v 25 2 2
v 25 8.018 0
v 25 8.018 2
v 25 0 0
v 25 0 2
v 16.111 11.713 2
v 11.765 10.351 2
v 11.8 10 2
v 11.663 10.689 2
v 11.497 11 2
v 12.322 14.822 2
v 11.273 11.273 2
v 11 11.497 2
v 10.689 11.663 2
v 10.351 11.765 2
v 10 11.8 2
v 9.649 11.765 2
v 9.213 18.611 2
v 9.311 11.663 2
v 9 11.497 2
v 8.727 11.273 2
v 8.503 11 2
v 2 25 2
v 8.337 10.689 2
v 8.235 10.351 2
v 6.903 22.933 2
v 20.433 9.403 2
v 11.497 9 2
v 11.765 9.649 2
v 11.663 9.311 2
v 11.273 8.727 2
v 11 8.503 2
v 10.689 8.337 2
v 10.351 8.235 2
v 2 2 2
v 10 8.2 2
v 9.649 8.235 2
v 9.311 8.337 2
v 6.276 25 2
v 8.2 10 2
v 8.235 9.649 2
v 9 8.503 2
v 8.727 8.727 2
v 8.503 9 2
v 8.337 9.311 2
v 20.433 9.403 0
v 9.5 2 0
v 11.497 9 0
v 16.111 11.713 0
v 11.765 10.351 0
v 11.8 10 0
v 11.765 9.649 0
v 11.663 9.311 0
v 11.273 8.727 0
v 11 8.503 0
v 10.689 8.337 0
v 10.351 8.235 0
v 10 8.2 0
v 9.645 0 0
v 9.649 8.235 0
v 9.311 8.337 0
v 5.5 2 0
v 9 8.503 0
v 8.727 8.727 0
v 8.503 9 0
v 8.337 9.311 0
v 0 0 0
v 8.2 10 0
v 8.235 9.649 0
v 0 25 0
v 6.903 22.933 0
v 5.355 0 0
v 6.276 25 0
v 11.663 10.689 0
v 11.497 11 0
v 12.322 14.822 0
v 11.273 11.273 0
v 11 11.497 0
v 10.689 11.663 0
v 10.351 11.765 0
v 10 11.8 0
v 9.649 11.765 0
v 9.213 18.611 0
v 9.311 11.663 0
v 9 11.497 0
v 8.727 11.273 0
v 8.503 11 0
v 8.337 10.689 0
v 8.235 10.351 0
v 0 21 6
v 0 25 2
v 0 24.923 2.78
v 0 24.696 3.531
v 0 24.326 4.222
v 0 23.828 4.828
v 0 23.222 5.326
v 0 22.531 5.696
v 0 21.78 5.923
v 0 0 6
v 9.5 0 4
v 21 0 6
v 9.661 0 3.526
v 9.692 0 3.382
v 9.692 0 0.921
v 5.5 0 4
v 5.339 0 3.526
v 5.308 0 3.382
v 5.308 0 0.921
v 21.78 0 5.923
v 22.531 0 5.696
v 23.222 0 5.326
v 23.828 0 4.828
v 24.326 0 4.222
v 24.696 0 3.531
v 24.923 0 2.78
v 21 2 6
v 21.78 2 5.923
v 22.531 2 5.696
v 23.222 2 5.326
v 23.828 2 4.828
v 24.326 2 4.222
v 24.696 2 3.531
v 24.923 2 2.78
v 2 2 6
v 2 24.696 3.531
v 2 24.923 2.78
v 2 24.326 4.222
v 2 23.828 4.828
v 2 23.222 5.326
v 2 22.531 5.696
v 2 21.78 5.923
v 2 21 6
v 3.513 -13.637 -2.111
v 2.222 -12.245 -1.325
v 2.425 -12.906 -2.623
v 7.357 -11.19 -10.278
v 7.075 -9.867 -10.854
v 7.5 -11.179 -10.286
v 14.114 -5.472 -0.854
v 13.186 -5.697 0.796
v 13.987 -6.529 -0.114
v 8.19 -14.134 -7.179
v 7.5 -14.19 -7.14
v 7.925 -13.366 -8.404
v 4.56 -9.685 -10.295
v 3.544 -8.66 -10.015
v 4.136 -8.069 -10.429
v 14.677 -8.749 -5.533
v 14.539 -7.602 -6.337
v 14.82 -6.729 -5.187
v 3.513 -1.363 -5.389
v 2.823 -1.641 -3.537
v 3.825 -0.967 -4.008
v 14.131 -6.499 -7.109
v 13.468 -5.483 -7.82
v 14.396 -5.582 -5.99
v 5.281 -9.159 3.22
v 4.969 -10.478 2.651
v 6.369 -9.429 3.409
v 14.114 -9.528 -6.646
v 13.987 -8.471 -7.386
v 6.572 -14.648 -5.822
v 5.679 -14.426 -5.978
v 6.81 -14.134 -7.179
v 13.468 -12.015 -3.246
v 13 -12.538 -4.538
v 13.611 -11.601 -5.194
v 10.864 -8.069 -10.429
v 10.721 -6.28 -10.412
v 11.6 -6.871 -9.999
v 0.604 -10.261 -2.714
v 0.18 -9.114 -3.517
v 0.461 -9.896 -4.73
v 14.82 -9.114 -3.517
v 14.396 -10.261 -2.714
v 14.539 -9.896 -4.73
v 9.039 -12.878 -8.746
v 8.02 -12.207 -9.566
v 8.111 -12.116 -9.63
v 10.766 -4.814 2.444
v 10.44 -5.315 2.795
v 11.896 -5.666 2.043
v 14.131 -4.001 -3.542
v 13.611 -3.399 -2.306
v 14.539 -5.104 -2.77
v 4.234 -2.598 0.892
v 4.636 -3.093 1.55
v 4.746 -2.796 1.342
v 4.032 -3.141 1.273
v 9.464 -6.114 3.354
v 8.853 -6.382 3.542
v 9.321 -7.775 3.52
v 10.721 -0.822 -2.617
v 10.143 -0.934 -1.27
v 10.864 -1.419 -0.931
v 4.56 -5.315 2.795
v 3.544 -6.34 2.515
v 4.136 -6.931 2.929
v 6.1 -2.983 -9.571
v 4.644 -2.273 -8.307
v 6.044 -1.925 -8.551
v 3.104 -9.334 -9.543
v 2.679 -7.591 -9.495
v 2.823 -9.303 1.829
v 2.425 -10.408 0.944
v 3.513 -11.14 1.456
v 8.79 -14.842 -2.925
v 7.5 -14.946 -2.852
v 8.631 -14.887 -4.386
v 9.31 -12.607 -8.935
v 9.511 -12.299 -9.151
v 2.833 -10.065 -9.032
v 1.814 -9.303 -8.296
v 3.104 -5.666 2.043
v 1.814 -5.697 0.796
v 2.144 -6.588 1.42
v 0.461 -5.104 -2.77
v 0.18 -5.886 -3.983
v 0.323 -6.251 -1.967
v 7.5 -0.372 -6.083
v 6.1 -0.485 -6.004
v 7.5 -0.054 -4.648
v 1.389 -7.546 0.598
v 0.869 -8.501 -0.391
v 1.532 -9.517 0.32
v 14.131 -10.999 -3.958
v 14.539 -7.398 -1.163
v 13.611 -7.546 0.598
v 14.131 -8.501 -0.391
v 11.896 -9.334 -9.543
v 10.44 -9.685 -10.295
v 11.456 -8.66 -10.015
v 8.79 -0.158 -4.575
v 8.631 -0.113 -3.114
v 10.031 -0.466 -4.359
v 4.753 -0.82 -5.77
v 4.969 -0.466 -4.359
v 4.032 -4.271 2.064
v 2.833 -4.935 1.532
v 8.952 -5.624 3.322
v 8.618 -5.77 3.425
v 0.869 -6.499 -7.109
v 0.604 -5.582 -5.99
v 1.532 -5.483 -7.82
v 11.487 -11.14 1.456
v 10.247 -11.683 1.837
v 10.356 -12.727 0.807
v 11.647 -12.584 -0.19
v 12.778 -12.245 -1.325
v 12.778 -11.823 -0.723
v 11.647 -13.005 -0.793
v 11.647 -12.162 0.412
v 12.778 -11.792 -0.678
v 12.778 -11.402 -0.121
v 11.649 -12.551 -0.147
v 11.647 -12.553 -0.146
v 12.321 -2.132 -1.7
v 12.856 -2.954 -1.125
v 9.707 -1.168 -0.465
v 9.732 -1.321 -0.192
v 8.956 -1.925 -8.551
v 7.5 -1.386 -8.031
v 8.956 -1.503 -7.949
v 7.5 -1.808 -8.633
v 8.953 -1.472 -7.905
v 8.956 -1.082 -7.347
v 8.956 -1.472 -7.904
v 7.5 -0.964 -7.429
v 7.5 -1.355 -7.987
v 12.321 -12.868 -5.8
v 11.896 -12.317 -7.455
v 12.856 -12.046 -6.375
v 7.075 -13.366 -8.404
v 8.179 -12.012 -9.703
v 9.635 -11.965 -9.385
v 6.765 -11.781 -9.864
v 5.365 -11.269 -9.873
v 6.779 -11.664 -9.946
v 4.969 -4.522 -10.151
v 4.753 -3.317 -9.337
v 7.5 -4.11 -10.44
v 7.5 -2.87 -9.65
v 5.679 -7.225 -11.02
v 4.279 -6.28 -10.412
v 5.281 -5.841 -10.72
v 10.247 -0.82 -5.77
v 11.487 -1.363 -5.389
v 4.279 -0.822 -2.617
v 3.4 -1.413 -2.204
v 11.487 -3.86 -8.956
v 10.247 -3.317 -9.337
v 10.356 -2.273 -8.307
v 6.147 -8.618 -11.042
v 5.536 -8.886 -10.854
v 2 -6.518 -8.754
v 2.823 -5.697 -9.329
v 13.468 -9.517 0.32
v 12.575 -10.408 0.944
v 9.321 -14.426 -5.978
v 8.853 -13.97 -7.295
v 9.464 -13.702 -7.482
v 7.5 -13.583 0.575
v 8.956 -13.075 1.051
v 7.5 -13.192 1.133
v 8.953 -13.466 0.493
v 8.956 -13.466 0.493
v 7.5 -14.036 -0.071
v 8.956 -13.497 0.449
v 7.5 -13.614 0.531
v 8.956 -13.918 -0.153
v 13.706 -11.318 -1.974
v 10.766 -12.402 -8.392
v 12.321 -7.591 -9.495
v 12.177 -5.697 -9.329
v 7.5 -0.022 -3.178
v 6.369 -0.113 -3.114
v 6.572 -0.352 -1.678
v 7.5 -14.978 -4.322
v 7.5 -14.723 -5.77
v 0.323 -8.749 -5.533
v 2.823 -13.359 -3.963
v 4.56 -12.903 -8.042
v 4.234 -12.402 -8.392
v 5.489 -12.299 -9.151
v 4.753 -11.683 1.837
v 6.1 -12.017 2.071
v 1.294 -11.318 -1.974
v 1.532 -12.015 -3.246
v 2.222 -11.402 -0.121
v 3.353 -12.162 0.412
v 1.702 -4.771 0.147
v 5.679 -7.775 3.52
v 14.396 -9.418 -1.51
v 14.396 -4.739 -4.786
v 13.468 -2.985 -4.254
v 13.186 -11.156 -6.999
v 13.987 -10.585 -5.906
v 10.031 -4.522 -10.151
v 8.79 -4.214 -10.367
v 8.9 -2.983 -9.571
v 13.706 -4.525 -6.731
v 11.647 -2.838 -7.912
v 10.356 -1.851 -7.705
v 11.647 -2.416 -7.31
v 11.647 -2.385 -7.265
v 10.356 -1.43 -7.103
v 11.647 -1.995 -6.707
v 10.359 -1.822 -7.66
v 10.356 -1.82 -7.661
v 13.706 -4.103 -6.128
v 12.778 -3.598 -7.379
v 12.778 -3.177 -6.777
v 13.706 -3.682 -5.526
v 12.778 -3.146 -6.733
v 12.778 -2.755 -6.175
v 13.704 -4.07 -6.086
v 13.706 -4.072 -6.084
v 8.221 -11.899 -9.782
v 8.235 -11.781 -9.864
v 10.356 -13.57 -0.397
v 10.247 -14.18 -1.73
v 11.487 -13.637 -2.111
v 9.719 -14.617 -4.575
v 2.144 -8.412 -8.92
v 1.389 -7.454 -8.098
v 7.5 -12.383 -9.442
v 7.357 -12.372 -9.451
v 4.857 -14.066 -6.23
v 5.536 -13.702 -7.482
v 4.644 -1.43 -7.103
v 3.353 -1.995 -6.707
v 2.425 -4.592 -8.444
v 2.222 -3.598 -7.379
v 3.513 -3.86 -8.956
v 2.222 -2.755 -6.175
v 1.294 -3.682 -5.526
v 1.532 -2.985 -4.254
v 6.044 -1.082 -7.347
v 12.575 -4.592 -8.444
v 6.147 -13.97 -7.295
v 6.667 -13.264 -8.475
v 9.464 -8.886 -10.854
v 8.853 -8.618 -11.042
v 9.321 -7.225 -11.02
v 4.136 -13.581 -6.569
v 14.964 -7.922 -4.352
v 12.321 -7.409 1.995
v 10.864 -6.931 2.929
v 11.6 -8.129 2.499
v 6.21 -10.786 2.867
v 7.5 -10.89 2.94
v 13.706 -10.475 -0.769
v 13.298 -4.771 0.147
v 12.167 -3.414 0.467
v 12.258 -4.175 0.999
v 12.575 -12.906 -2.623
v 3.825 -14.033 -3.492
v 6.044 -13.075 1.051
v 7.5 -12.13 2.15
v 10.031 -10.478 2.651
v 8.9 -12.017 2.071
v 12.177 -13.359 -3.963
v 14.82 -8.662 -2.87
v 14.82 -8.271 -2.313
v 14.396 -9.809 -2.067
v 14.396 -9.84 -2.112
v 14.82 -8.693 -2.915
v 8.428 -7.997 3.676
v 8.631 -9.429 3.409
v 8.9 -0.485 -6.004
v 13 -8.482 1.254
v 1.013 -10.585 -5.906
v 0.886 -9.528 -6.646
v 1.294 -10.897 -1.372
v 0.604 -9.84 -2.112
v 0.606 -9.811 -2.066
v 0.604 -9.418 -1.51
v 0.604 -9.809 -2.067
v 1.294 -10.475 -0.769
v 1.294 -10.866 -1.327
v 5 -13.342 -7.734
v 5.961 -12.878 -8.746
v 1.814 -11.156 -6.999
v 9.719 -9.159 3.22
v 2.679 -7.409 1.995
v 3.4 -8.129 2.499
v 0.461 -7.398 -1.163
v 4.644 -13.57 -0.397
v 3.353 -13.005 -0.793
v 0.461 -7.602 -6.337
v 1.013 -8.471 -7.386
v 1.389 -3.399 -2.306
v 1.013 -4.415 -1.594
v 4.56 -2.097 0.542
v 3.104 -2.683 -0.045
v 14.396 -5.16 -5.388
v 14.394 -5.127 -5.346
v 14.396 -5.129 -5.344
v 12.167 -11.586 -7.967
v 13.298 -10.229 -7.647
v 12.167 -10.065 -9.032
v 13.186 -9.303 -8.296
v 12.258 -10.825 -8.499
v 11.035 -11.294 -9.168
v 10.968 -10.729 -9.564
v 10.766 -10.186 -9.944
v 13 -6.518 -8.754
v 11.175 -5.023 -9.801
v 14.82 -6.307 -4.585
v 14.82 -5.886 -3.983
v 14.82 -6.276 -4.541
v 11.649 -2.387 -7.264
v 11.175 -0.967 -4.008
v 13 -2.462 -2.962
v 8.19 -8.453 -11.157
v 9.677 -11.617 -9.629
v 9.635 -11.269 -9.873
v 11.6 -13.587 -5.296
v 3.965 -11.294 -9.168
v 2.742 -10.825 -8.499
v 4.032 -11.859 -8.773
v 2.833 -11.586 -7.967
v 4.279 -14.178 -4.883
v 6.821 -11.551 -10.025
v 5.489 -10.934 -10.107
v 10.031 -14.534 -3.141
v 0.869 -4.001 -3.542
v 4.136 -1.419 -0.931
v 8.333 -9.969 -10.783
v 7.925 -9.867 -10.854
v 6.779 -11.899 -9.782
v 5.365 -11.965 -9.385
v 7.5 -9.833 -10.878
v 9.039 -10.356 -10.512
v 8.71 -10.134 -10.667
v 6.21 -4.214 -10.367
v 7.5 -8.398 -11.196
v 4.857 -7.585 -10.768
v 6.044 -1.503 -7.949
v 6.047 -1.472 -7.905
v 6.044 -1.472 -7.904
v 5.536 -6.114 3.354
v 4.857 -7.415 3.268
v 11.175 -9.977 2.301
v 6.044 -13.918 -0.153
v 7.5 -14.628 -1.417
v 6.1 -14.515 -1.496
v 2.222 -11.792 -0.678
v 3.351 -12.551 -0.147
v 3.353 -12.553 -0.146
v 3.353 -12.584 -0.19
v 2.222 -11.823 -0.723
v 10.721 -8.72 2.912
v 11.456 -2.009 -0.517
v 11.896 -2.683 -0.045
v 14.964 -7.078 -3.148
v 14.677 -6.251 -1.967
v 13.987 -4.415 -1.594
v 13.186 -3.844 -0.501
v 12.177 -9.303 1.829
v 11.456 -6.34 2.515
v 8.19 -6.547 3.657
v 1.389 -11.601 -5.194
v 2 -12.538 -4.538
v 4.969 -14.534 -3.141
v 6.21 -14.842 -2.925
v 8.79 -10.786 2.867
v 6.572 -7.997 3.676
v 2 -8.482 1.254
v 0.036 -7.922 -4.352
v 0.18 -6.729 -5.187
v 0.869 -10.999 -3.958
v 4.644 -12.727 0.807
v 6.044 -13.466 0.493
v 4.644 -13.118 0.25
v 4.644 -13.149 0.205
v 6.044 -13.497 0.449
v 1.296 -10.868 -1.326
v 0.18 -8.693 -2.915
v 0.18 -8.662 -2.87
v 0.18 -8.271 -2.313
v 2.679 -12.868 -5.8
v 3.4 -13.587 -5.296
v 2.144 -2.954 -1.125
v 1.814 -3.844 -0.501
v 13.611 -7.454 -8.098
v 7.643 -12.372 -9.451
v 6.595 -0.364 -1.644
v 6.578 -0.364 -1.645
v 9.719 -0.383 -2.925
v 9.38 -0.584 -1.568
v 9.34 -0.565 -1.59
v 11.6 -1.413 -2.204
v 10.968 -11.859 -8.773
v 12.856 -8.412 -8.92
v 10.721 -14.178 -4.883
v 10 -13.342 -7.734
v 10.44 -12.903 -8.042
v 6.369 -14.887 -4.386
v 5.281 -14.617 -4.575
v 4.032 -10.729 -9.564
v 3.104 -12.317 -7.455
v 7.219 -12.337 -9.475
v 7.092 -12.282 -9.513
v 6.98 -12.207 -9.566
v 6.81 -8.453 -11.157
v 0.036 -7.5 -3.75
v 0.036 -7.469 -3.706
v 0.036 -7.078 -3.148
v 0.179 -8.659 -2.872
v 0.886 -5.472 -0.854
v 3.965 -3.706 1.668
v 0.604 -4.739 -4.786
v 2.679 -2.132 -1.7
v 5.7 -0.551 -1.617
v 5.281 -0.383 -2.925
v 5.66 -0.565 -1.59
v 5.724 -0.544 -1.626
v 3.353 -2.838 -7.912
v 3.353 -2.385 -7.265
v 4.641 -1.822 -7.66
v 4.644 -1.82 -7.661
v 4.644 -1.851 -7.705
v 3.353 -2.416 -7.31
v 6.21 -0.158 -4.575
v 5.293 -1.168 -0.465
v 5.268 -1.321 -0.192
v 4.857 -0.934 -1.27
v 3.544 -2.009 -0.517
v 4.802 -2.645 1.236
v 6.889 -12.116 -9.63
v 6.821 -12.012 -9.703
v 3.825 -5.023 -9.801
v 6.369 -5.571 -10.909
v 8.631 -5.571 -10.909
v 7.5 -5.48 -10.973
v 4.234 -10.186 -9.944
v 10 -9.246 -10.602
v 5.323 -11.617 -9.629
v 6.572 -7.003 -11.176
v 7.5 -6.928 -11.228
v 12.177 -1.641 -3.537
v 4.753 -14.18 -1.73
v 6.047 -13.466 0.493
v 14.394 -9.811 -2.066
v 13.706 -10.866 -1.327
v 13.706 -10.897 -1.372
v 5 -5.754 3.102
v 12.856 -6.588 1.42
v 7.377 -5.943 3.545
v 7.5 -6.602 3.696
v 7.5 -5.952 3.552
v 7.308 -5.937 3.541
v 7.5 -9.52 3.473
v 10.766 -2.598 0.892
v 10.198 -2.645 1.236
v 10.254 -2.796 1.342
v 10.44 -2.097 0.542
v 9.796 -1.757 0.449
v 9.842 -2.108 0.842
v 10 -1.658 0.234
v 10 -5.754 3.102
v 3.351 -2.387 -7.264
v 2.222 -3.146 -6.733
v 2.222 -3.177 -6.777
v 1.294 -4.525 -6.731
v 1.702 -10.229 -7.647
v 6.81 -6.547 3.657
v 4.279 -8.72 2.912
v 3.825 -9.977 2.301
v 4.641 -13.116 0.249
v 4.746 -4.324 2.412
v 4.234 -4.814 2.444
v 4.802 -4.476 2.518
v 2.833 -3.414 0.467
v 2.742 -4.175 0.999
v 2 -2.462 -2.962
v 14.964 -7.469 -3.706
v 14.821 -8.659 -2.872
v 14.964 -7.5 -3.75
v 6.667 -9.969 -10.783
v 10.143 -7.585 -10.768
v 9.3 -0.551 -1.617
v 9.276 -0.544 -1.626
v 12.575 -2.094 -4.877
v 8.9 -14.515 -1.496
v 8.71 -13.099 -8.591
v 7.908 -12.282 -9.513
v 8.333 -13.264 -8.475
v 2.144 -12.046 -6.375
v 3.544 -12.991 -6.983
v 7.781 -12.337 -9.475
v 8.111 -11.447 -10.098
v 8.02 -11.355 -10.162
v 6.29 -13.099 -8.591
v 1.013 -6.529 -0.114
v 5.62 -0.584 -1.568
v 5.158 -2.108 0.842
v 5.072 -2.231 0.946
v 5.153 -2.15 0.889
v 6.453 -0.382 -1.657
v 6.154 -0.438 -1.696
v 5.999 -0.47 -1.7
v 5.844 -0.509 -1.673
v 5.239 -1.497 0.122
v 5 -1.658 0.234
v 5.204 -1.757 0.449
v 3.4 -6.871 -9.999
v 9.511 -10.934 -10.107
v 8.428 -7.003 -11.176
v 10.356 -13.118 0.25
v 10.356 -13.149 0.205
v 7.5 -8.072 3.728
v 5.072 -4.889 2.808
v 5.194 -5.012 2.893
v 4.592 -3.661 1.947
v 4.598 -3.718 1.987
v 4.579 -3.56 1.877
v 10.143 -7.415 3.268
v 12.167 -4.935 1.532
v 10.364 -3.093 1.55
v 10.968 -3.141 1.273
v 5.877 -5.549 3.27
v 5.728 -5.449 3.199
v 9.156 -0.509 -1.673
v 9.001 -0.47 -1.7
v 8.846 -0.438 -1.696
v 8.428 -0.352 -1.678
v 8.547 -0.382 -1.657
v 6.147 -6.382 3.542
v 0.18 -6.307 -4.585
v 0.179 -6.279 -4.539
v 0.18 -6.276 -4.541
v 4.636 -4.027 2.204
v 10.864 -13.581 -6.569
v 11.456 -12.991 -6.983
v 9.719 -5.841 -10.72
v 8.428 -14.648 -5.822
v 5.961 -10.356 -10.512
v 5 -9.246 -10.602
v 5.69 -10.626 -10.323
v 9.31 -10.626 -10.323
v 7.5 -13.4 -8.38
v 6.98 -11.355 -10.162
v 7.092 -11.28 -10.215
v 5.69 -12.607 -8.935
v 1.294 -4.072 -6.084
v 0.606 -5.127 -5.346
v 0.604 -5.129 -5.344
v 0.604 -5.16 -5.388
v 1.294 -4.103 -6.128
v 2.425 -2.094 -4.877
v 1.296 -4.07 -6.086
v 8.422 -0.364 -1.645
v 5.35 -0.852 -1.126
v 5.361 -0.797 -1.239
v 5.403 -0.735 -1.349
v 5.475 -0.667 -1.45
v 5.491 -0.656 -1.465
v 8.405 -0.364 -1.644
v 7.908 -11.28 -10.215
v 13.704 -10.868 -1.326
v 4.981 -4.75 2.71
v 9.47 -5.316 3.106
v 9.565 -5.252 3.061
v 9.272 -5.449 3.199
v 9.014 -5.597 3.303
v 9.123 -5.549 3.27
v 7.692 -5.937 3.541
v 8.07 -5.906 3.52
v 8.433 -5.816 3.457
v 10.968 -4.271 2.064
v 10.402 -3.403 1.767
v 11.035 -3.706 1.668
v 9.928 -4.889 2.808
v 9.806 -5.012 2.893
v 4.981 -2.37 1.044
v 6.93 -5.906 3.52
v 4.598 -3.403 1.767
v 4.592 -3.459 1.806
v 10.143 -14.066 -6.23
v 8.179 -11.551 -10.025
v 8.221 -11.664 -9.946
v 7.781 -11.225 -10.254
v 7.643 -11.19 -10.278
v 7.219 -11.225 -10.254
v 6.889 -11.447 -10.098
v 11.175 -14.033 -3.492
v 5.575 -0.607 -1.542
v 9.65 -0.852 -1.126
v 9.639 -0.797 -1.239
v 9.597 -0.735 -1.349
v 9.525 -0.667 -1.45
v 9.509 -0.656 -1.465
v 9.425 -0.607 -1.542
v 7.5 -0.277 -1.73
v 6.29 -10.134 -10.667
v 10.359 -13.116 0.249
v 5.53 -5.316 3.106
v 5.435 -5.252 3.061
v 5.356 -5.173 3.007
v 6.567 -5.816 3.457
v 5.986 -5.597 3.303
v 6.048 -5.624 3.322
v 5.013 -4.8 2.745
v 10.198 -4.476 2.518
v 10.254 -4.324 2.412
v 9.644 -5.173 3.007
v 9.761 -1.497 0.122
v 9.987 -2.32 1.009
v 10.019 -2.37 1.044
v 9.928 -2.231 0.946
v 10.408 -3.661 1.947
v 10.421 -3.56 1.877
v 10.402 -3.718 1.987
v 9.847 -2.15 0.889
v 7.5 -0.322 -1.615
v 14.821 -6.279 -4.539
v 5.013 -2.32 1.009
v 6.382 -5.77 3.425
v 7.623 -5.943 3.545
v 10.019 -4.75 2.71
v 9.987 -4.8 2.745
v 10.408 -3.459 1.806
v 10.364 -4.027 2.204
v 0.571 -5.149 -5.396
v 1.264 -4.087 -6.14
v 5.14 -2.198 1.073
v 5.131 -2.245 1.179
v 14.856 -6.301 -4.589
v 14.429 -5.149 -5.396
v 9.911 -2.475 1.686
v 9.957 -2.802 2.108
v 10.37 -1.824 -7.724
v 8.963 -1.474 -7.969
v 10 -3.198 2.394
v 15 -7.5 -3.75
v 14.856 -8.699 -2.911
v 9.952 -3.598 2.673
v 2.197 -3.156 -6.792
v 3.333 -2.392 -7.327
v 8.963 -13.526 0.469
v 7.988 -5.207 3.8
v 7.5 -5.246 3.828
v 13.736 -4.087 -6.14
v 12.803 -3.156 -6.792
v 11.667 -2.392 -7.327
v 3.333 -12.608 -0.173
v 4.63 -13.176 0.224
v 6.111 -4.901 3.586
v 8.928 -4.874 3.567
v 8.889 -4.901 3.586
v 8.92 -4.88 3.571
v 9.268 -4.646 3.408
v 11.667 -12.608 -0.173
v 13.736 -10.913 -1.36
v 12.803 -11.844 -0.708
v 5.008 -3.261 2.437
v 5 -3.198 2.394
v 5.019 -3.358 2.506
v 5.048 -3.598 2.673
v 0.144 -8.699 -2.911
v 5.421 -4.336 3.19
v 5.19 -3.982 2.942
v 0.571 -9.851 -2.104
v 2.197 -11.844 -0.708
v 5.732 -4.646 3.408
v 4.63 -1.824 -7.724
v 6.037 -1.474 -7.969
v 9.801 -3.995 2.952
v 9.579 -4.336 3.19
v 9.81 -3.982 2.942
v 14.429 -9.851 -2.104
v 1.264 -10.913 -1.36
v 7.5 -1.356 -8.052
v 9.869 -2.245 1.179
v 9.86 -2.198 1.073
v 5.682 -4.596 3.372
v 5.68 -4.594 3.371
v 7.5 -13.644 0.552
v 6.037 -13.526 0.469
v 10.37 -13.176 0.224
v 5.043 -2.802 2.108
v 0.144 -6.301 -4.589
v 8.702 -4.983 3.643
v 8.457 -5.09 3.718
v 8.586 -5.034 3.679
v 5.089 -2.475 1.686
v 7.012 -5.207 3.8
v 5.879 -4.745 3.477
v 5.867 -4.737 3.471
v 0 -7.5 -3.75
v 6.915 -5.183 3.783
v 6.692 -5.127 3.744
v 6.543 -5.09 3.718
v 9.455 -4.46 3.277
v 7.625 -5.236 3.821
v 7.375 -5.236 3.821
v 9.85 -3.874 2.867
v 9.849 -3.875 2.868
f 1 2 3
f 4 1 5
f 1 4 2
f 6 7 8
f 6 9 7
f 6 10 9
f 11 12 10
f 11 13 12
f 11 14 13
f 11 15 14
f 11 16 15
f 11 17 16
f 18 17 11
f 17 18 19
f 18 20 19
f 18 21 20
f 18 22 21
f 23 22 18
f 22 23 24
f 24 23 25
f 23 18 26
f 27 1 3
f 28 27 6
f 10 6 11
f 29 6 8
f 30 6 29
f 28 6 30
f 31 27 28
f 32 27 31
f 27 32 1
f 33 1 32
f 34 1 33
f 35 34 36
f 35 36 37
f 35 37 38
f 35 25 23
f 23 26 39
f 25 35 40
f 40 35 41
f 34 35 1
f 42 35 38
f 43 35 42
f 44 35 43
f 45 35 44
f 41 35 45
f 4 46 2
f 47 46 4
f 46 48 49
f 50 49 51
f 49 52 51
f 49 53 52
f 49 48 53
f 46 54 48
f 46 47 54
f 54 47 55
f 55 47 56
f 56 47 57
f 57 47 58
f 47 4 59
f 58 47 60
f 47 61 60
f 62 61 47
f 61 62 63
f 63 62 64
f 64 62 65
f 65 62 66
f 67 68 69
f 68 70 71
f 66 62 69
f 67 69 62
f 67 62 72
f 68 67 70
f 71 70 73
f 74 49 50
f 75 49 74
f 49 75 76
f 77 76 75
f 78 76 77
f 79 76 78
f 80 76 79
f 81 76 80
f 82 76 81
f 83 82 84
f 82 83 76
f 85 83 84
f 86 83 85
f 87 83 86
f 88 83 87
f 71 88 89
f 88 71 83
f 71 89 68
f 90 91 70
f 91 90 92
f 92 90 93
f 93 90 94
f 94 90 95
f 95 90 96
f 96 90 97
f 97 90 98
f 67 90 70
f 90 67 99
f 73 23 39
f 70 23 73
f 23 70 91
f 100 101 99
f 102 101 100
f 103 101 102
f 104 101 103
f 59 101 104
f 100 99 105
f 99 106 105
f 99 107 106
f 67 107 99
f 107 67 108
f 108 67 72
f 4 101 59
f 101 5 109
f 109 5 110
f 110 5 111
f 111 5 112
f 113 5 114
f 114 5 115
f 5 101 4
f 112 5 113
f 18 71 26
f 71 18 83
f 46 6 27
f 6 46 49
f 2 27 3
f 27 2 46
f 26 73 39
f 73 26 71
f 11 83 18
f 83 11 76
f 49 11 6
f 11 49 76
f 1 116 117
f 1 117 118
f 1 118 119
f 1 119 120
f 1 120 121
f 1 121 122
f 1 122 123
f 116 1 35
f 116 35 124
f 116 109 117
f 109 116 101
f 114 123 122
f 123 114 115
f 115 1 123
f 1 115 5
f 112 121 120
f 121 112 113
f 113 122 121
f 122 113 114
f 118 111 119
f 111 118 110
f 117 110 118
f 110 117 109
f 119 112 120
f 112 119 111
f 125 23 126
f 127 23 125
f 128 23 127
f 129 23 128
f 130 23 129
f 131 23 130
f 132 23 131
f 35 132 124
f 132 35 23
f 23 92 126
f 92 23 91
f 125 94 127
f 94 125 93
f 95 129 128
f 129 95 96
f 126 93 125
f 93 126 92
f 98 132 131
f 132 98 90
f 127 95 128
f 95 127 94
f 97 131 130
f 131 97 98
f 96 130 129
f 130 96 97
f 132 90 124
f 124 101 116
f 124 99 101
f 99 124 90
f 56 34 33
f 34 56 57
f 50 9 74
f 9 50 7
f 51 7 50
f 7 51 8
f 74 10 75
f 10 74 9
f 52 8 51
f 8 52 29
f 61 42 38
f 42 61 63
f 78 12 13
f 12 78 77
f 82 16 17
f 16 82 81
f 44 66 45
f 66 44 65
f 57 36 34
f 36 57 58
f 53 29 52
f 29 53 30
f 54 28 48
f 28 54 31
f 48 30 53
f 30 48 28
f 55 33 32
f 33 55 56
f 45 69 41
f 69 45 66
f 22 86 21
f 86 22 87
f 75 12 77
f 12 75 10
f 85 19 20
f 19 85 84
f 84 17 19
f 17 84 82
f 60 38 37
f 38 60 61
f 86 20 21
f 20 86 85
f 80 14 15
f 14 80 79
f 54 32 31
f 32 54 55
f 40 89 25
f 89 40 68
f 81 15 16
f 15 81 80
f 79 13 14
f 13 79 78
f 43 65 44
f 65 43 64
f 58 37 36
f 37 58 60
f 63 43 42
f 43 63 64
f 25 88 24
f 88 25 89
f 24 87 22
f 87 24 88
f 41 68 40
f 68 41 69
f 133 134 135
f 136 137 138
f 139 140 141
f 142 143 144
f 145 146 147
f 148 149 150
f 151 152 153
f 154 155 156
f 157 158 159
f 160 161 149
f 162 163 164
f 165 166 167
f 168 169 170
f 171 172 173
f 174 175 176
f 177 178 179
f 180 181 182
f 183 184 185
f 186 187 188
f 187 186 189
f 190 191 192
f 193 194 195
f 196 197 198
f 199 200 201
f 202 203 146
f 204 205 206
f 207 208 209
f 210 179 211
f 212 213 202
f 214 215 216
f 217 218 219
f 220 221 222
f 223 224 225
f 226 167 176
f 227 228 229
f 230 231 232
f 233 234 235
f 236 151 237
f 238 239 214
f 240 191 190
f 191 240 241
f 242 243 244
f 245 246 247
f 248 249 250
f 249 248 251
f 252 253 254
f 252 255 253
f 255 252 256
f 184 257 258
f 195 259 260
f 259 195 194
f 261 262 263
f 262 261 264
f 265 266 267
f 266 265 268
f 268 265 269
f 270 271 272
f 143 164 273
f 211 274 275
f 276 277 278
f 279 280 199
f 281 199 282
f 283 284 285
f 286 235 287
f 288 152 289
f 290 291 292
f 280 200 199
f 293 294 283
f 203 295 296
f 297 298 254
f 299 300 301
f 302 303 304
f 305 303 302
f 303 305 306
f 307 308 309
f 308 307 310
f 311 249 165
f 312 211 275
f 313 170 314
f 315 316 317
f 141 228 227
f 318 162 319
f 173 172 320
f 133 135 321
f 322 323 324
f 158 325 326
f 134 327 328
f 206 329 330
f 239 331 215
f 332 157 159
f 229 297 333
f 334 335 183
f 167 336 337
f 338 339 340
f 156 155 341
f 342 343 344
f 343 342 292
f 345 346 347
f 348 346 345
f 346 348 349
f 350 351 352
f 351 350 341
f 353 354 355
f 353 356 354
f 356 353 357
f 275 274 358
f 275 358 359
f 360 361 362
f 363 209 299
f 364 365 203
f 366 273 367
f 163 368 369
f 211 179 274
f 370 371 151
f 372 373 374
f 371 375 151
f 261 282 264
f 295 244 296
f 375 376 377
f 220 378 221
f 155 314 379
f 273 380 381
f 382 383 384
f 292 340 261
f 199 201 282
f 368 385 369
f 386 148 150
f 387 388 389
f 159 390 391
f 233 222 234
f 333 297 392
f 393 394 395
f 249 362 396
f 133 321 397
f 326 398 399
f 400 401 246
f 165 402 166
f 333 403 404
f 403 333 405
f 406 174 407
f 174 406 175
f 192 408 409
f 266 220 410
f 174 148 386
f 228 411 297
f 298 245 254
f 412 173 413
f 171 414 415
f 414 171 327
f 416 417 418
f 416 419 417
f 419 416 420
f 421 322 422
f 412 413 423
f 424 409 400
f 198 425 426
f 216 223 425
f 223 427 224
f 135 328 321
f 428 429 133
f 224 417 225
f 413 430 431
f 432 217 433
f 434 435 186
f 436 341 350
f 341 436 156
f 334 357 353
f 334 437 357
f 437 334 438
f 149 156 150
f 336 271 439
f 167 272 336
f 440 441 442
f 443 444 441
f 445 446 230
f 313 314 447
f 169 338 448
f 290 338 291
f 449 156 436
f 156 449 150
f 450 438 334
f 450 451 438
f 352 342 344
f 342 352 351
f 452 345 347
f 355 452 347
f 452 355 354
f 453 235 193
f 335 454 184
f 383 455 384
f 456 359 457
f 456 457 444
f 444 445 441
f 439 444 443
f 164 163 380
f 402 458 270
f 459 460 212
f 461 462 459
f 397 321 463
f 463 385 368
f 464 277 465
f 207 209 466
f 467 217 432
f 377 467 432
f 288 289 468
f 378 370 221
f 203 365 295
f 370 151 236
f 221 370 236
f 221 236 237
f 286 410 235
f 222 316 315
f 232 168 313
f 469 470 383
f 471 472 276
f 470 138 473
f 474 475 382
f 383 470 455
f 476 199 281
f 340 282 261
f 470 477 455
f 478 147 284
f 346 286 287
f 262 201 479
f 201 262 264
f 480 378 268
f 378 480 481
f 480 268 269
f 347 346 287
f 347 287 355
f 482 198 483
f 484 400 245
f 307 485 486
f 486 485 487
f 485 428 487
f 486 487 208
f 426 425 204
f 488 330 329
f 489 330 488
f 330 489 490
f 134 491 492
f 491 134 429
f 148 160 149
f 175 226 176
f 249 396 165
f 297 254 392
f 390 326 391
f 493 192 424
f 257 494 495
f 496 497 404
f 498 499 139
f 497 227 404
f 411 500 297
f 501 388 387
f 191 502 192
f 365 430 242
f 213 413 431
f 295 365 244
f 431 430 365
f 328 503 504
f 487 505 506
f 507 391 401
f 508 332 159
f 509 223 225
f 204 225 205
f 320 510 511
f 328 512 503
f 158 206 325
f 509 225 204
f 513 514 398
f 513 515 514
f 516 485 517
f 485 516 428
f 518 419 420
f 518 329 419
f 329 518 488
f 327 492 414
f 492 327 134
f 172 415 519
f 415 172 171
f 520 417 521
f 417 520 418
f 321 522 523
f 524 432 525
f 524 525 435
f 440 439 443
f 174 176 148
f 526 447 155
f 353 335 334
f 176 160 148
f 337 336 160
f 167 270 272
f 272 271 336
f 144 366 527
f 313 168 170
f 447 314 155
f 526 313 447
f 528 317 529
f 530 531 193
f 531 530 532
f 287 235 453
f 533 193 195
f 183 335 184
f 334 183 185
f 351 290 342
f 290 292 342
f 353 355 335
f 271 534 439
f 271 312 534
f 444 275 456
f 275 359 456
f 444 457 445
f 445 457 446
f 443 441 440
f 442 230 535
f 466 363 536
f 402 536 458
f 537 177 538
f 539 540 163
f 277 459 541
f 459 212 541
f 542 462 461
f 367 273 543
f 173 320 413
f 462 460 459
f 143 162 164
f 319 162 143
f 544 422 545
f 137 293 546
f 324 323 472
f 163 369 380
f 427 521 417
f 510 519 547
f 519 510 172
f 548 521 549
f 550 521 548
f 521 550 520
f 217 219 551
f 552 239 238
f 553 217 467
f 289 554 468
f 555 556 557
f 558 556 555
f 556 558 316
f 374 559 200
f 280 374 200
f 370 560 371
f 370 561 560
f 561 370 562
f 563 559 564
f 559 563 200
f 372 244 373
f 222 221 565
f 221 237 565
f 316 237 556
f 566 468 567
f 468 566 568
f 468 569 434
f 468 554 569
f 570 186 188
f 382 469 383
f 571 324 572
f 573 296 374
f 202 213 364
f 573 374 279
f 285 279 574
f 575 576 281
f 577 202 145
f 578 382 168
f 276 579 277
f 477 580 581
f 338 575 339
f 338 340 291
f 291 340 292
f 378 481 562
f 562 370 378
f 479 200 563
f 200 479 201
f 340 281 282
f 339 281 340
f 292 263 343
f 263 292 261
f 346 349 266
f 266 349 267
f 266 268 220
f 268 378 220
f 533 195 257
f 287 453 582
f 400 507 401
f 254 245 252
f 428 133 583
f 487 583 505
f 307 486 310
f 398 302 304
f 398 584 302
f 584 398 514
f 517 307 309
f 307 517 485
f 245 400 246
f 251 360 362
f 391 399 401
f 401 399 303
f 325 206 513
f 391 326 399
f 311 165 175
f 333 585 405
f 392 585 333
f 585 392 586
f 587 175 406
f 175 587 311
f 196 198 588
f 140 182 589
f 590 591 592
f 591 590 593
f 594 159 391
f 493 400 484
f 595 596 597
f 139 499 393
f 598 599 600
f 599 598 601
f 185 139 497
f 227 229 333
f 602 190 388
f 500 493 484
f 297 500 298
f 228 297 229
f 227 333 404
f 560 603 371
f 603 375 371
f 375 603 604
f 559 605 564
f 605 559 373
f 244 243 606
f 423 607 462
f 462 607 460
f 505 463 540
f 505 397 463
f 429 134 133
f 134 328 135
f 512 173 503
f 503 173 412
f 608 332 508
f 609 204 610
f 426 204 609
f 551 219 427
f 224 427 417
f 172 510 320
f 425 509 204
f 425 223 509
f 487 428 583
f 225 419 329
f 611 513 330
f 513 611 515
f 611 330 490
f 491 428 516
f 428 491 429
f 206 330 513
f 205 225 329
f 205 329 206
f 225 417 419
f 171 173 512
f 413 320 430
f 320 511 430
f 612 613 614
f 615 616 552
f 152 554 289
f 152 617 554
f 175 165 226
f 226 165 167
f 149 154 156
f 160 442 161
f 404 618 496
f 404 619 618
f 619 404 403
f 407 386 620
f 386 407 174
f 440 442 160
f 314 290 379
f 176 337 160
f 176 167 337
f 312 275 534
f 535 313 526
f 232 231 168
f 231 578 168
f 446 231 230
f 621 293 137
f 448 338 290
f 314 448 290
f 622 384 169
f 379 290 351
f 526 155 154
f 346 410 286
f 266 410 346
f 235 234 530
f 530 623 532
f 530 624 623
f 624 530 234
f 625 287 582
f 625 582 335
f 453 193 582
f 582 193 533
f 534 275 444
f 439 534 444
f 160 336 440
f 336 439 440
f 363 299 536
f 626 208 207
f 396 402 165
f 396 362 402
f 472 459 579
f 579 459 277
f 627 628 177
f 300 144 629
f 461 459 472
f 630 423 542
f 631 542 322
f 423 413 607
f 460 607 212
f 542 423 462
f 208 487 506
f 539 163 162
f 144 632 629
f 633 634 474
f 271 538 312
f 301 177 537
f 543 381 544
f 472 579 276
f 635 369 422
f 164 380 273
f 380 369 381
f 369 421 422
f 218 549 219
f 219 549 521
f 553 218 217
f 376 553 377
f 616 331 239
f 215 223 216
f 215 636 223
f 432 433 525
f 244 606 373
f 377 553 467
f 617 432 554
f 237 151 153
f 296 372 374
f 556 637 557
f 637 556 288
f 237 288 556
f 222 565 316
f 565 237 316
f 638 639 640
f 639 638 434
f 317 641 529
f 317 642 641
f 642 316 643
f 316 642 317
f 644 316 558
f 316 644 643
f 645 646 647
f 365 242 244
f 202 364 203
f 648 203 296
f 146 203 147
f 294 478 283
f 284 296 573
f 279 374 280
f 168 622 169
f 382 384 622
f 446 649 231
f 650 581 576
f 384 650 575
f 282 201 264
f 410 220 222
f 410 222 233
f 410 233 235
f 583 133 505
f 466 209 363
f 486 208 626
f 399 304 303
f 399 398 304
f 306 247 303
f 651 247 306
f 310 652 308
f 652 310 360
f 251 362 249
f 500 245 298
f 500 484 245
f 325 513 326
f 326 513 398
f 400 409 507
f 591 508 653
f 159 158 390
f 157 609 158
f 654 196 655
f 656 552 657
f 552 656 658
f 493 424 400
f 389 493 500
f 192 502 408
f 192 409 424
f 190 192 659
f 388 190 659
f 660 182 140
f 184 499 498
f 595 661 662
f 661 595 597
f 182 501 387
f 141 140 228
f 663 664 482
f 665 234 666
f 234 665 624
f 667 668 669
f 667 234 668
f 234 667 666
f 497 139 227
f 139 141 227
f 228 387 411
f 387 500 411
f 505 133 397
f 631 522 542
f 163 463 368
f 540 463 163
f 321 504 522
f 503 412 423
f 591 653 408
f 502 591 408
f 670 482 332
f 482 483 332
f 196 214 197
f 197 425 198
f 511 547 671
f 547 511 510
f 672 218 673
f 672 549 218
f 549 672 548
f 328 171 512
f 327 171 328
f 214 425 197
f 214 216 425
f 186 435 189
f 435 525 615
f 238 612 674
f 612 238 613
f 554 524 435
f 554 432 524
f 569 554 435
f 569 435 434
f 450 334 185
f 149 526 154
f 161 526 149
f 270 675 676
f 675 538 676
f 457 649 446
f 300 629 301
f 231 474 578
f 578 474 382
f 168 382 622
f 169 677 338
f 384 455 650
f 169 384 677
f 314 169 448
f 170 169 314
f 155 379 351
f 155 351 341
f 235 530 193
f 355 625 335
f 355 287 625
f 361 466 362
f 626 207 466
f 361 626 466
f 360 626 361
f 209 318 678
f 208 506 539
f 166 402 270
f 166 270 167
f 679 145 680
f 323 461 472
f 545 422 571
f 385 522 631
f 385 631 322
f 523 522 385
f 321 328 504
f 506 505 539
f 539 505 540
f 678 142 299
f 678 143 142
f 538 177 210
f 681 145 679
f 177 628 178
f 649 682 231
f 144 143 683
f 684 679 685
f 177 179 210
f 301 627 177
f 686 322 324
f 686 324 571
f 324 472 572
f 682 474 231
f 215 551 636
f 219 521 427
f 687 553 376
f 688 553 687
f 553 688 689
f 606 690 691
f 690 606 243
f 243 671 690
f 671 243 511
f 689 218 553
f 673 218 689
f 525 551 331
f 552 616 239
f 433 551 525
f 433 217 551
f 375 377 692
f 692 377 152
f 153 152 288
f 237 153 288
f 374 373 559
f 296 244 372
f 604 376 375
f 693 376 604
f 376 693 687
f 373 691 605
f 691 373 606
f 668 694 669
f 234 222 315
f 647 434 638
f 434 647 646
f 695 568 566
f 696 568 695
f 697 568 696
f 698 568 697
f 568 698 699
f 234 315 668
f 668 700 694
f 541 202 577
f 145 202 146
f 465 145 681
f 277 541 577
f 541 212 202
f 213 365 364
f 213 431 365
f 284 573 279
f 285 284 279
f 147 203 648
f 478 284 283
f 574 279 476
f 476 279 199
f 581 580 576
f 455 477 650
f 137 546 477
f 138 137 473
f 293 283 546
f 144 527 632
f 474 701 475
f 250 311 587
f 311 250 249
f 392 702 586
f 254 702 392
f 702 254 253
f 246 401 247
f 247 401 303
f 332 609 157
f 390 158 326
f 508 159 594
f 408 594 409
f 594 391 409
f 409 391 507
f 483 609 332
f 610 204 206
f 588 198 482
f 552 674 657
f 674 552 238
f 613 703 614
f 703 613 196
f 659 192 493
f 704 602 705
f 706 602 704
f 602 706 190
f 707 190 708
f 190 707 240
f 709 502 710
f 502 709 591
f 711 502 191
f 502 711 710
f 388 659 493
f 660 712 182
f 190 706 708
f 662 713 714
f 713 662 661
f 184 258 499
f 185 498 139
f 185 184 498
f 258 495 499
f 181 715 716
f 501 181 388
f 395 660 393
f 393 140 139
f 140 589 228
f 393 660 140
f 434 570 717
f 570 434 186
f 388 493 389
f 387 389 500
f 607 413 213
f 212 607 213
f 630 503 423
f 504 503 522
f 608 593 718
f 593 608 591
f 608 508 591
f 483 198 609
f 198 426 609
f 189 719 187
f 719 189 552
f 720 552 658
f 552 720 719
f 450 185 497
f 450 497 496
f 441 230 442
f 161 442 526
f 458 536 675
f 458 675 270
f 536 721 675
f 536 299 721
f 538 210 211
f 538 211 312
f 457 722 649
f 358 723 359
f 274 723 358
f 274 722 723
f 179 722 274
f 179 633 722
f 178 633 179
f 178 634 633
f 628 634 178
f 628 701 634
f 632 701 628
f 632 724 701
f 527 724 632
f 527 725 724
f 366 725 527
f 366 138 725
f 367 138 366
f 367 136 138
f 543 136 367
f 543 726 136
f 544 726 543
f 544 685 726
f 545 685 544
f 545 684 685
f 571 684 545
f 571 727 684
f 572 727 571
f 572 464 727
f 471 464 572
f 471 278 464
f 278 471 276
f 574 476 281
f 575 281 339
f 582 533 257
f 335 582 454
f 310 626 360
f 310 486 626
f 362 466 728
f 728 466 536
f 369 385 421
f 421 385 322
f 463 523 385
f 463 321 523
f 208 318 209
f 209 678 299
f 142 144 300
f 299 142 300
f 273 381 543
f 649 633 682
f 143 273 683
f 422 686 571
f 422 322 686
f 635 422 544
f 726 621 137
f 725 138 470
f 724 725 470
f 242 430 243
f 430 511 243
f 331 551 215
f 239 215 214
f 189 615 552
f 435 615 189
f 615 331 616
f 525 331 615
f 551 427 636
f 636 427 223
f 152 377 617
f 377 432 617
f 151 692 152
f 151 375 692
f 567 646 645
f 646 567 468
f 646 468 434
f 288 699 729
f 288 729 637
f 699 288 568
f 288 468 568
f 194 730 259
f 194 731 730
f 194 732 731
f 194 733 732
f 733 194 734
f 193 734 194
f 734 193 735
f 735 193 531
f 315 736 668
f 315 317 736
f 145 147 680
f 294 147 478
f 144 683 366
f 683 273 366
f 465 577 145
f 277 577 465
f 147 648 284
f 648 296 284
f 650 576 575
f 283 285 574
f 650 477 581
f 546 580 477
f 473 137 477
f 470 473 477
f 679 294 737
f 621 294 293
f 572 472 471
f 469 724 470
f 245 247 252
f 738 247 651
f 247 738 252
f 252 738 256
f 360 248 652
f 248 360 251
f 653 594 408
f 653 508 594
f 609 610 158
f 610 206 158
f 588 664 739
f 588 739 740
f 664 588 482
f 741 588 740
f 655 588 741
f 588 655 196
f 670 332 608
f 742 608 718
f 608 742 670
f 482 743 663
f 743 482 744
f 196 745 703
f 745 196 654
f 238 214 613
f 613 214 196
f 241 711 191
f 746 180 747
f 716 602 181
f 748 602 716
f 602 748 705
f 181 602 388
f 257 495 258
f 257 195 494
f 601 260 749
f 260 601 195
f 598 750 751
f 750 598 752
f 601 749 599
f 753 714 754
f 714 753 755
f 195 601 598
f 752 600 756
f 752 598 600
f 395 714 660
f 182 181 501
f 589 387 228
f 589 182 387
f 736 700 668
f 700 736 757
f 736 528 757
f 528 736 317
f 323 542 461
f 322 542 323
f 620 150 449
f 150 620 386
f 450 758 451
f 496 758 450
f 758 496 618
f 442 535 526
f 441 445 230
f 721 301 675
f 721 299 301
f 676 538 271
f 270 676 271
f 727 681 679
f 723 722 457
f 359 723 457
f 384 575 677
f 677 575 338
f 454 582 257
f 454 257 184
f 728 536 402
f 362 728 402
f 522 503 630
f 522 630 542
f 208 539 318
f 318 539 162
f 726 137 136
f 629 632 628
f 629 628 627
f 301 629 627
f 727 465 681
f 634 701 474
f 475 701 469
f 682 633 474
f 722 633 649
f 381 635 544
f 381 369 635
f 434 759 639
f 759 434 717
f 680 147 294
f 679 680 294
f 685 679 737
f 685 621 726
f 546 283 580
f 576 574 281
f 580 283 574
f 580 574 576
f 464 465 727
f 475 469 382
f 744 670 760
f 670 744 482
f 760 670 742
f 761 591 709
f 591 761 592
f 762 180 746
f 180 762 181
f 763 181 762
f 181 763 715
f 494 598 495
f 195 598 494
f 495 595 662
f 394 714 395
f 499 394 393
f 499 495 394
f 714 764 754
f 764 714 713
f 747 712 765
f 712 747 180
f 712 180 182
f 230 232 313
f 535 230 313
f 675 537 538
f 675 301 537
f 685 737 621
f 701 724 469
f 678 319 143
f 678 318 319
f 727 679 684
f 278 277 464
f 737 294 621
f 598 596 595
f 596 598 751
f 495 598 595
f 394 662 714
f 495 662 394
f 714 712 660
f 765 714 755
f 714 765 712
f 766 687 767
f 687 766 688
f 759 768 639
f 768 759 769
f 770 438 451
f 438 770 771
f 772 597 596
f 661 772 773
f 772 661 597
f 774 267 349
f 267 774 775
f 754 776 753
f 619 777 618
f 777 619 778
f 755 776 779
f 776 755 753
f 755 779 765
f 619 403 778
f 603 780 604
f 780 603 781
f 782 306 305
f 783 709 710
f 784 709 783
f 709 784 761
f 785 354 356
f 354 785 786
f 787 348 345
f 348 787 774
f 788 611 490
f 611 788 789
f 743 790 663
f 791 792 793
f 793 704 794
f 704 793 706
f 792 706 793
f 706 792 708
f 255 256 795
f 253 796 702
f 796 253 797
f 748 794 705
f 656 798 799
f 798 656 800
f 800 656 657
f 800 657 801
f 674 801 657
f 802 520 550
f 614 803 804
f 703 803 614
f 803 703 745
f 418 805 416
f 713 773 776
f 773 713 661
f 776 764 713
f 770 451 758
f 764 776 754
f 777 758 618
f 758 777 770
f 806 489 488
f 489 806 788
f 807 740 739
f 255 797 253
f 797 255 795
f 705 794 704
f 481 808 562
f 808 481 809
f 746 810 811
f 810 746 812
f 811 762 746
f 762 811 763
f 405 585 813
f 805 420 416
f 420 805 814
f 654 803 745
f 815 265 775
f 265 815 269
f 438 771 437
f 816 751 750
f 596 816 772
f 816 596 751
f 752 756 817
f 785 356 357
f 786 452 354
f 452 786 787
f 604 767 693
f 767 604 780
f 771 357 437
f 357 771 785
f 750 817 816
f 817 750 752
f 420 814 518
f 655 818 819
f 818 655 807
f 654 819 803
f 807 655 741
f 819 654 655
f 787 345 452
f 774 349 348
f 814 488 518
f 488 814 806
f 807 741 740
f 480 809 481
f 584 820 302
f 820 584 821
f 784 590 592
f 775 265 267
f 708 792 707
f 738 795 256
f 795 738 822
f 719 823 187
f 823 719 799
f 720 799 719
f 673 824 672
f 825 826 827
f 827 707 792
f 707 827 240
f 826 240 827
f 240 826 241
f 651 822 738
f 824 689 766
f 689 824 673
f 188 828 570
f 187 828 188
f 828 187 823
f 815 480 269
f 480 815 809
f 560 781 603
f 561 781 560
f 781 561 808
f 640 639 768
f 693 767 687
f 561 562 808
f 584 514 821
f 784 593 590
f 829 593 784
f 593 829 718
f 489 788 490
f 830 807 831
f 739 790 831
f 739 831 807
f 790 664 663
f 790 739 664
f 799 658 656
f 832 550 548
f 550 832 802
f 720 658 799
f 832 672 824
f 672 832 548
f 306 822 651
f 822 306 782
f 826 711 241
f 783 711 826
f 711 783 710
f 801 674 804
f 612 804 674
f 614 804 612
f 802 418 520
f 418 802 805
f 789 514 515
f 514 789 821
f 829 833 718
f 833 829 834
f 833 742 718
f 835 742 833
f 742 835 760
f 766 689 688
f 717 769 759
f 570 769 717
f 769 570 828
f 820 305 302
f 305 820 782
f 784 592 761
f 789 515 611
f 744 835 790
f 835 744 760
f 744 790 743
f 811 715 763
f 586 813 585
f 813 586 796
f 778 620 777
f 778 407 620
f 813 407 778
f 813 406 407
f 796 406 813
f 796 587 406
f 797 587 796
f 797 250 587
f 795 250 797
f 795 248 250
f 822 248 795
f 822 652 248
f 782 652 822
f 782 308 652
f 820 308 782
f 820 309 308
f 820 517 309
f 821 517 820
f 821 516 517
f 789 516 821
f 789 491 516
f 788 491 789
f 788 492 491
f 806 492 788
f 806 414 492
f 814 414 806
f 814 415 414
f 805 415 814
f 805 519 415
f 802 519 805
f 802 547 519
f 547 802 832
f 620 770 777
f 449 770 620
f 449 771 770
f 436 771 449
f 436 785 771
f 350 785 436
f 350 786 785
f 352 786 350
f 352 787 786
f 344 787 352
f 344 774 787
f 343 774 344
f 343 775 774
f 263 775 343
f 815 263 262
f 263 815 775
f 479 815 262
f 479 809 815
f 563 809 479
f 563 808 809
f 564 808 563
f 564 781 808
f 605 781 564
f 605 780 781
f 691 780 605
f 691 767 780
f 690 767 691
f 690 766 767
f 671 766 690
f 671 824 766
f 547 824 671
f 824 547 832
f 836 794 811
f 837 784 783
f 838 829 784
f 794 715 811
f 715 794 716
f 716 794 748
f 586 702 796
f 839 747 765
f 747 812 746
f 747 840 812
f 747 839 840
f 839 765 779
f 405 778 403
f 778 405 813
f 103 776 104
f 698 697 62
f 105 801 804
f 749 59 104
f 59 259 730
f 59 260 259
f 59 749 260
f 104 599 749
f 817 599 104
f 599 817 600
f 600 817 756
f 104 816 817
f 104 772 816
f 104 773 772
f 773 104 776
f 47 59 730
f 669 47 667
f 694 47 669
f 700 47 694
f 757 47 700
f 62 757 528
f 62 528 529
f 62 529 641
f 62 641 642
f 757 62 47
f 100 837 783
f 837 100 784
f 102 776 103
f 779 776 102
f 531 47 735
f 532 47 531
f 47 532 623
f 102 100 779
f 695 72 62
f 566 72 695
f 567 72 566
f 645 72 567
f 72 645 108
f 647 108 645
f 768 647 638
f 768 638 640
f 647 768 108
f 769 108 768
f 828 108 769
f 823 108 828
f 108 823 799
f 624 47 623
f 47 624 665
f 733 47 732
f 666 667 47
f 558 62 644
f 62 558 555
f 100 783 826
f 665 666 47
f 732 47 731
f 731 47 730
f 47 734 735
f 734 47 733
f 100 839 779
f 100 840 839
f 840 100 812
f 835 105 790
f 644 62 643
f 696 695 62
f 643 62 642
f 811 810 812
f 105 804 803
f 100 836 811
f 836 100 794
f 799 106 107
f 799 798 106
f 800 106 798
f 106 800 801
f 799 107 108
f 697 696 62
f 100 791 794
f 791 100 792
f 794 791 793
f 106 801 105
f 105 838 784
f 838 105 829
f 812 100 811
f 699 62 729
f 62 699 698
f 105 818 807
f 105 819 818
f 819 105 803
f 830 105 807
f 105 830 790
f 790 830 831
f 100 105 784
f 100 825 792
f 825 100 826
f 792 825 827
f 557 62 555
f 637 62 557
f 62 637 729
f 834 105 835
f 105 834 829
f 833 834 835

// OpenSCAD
$fn = 32;

wall_height=2;
wall_thickness=2;
bottom_height=2;

hole_to_wall_x=2;
hole_to_wall_y=2.5;
hole_r=2;

size=35;

module mount() {
    difference() {
        union() {
            intersection() {
                cube([size, size, 7]);
                cylinder(h=bottom_height, r=size);
            }
            translate([0, 0, bottom_height]) {
                cube([wall_thickness, size-wall_height, wall_height]);
                cube([size-wall_height, wall_thickness, wall_height]);
                intersection() {
                    cube([size, wall_thickness, wall_height]);
                    translate([size-wall_height, wall_thickness, 0])
                        rotate(90, [1, 0, 0])
                            cylinder(h=wall_thickness, r=wall_height);
                }
                intersection() {
                    cube([wall_thickness, size, wall_height]);
                    translate([0, size-wall_height, 0])
                        rotate(90, [0, 1, 0])
                            cylinder(h=wall_thickness, r=wall_height);
                }
            }
        }
        wall_distance_x = wall_thickness + hole_r + hole_to_wall_x;
        wall_distance_y = wall_thickness + hole_r + hole_to_wall_y;
        translate([wall_distance_x, wall_distance_y, 0])
            cylinder(h=bottom_height+1, r=hole_r);
    }
}

module x_mount() {
    wall_height=4;
    size=25;
    hole_r=1.8;
    difference() {
        union() {
            difference() {
                cube([size, size, bottom_height]);
                translate([size*1.2, size*1.3, 0])
                    cylinder(h=bottom_height, r=size);
            }
            translate([0, 0, bottom_height]) {
                cube([wall_thickness, size-wall_height, wall_height]);
                cube([size-wall_height, wall_thickness, wall_height]);
                intersection() {
                    cube([size, wall_thickness, wall_height]);
                    translate([size-wall_height, wall_thickness, 0])
                        rotate(90, [1, 0, 0])
                            cylinder(h=wall_thickness, r=wall_height);
                }
                intersection() {
                    cube([wall_thickness, size, wall_height]);
                    translate([0, size-wall_height, 0])
                        rotate(90, [0, 1, 0])
                            cylinder(h=wall_thickness, r=wall_height);
                }
            }
        }
        wall_distance_x = 8 + wall_thickness;
        wall_distance_y = 8 + wall_thickness;
        #translate([wall_distance_x, wall_distance_y, 0])
            cylinder(h=bottom_height+1, r=hole_r);
    }
}

module x_with_ball() {
    x_mount();
    ball_size = 7.5;
    translate([ball_size, -ball_size, -ball_size/2]) {
        rotate(145, [1,0,0]) {
            sphere(r=ball_size, center=true);
            translate([0, 0, -ball_size/2])
                cylinder(h=ball_size, r=ball_size / 3, r2=ball_size, center=true);
        }
    }
    hull() {
        translate([ball_size, -ball_size, -ball_size/2]) {
            rotate(145, [1,0,0])
                translate([0, 0, -ball_size/2])
                    cylinder(h=ball_size, r=ball_size / 3, center=true);
        }
        translate([ball_size-(bottom_height+wall_height)/2, 0, 0])
            cube([bottom_height+wall_height,wall_thickness,bottom_height+wall_height]);
    }
}

module bed_with_ball() {
    mount();
    ball_size = 7.5;
    translate([ball_size, -ball_size, ball_size]) {
        rotate(55, [1,0,0]) {
            sphere(r=ball_size, center=true);
            translate([0, 0, -ball_size/2])
                cylinder(h=ball_size, r=ball_size / 3, r2=ball_size, center=true);
        }
    }
    hull() {
        translate([ball_size, -ball_size, ball_size]) {
            rotate(55, [1,0,0])
                translate([0, 0, -ball_size/2])
                    cylinder(h=ball_size, r=ball_size / 3, center=true);
        }
        translate([ball_size-(bottom_height+wall_height)/2, 0, 0])
            cube([bottom_height+wall_height,wall_thickness,bottom_height+wall_height]);
    }
}

/* bed_with_ball(); */
x_with_ball();
